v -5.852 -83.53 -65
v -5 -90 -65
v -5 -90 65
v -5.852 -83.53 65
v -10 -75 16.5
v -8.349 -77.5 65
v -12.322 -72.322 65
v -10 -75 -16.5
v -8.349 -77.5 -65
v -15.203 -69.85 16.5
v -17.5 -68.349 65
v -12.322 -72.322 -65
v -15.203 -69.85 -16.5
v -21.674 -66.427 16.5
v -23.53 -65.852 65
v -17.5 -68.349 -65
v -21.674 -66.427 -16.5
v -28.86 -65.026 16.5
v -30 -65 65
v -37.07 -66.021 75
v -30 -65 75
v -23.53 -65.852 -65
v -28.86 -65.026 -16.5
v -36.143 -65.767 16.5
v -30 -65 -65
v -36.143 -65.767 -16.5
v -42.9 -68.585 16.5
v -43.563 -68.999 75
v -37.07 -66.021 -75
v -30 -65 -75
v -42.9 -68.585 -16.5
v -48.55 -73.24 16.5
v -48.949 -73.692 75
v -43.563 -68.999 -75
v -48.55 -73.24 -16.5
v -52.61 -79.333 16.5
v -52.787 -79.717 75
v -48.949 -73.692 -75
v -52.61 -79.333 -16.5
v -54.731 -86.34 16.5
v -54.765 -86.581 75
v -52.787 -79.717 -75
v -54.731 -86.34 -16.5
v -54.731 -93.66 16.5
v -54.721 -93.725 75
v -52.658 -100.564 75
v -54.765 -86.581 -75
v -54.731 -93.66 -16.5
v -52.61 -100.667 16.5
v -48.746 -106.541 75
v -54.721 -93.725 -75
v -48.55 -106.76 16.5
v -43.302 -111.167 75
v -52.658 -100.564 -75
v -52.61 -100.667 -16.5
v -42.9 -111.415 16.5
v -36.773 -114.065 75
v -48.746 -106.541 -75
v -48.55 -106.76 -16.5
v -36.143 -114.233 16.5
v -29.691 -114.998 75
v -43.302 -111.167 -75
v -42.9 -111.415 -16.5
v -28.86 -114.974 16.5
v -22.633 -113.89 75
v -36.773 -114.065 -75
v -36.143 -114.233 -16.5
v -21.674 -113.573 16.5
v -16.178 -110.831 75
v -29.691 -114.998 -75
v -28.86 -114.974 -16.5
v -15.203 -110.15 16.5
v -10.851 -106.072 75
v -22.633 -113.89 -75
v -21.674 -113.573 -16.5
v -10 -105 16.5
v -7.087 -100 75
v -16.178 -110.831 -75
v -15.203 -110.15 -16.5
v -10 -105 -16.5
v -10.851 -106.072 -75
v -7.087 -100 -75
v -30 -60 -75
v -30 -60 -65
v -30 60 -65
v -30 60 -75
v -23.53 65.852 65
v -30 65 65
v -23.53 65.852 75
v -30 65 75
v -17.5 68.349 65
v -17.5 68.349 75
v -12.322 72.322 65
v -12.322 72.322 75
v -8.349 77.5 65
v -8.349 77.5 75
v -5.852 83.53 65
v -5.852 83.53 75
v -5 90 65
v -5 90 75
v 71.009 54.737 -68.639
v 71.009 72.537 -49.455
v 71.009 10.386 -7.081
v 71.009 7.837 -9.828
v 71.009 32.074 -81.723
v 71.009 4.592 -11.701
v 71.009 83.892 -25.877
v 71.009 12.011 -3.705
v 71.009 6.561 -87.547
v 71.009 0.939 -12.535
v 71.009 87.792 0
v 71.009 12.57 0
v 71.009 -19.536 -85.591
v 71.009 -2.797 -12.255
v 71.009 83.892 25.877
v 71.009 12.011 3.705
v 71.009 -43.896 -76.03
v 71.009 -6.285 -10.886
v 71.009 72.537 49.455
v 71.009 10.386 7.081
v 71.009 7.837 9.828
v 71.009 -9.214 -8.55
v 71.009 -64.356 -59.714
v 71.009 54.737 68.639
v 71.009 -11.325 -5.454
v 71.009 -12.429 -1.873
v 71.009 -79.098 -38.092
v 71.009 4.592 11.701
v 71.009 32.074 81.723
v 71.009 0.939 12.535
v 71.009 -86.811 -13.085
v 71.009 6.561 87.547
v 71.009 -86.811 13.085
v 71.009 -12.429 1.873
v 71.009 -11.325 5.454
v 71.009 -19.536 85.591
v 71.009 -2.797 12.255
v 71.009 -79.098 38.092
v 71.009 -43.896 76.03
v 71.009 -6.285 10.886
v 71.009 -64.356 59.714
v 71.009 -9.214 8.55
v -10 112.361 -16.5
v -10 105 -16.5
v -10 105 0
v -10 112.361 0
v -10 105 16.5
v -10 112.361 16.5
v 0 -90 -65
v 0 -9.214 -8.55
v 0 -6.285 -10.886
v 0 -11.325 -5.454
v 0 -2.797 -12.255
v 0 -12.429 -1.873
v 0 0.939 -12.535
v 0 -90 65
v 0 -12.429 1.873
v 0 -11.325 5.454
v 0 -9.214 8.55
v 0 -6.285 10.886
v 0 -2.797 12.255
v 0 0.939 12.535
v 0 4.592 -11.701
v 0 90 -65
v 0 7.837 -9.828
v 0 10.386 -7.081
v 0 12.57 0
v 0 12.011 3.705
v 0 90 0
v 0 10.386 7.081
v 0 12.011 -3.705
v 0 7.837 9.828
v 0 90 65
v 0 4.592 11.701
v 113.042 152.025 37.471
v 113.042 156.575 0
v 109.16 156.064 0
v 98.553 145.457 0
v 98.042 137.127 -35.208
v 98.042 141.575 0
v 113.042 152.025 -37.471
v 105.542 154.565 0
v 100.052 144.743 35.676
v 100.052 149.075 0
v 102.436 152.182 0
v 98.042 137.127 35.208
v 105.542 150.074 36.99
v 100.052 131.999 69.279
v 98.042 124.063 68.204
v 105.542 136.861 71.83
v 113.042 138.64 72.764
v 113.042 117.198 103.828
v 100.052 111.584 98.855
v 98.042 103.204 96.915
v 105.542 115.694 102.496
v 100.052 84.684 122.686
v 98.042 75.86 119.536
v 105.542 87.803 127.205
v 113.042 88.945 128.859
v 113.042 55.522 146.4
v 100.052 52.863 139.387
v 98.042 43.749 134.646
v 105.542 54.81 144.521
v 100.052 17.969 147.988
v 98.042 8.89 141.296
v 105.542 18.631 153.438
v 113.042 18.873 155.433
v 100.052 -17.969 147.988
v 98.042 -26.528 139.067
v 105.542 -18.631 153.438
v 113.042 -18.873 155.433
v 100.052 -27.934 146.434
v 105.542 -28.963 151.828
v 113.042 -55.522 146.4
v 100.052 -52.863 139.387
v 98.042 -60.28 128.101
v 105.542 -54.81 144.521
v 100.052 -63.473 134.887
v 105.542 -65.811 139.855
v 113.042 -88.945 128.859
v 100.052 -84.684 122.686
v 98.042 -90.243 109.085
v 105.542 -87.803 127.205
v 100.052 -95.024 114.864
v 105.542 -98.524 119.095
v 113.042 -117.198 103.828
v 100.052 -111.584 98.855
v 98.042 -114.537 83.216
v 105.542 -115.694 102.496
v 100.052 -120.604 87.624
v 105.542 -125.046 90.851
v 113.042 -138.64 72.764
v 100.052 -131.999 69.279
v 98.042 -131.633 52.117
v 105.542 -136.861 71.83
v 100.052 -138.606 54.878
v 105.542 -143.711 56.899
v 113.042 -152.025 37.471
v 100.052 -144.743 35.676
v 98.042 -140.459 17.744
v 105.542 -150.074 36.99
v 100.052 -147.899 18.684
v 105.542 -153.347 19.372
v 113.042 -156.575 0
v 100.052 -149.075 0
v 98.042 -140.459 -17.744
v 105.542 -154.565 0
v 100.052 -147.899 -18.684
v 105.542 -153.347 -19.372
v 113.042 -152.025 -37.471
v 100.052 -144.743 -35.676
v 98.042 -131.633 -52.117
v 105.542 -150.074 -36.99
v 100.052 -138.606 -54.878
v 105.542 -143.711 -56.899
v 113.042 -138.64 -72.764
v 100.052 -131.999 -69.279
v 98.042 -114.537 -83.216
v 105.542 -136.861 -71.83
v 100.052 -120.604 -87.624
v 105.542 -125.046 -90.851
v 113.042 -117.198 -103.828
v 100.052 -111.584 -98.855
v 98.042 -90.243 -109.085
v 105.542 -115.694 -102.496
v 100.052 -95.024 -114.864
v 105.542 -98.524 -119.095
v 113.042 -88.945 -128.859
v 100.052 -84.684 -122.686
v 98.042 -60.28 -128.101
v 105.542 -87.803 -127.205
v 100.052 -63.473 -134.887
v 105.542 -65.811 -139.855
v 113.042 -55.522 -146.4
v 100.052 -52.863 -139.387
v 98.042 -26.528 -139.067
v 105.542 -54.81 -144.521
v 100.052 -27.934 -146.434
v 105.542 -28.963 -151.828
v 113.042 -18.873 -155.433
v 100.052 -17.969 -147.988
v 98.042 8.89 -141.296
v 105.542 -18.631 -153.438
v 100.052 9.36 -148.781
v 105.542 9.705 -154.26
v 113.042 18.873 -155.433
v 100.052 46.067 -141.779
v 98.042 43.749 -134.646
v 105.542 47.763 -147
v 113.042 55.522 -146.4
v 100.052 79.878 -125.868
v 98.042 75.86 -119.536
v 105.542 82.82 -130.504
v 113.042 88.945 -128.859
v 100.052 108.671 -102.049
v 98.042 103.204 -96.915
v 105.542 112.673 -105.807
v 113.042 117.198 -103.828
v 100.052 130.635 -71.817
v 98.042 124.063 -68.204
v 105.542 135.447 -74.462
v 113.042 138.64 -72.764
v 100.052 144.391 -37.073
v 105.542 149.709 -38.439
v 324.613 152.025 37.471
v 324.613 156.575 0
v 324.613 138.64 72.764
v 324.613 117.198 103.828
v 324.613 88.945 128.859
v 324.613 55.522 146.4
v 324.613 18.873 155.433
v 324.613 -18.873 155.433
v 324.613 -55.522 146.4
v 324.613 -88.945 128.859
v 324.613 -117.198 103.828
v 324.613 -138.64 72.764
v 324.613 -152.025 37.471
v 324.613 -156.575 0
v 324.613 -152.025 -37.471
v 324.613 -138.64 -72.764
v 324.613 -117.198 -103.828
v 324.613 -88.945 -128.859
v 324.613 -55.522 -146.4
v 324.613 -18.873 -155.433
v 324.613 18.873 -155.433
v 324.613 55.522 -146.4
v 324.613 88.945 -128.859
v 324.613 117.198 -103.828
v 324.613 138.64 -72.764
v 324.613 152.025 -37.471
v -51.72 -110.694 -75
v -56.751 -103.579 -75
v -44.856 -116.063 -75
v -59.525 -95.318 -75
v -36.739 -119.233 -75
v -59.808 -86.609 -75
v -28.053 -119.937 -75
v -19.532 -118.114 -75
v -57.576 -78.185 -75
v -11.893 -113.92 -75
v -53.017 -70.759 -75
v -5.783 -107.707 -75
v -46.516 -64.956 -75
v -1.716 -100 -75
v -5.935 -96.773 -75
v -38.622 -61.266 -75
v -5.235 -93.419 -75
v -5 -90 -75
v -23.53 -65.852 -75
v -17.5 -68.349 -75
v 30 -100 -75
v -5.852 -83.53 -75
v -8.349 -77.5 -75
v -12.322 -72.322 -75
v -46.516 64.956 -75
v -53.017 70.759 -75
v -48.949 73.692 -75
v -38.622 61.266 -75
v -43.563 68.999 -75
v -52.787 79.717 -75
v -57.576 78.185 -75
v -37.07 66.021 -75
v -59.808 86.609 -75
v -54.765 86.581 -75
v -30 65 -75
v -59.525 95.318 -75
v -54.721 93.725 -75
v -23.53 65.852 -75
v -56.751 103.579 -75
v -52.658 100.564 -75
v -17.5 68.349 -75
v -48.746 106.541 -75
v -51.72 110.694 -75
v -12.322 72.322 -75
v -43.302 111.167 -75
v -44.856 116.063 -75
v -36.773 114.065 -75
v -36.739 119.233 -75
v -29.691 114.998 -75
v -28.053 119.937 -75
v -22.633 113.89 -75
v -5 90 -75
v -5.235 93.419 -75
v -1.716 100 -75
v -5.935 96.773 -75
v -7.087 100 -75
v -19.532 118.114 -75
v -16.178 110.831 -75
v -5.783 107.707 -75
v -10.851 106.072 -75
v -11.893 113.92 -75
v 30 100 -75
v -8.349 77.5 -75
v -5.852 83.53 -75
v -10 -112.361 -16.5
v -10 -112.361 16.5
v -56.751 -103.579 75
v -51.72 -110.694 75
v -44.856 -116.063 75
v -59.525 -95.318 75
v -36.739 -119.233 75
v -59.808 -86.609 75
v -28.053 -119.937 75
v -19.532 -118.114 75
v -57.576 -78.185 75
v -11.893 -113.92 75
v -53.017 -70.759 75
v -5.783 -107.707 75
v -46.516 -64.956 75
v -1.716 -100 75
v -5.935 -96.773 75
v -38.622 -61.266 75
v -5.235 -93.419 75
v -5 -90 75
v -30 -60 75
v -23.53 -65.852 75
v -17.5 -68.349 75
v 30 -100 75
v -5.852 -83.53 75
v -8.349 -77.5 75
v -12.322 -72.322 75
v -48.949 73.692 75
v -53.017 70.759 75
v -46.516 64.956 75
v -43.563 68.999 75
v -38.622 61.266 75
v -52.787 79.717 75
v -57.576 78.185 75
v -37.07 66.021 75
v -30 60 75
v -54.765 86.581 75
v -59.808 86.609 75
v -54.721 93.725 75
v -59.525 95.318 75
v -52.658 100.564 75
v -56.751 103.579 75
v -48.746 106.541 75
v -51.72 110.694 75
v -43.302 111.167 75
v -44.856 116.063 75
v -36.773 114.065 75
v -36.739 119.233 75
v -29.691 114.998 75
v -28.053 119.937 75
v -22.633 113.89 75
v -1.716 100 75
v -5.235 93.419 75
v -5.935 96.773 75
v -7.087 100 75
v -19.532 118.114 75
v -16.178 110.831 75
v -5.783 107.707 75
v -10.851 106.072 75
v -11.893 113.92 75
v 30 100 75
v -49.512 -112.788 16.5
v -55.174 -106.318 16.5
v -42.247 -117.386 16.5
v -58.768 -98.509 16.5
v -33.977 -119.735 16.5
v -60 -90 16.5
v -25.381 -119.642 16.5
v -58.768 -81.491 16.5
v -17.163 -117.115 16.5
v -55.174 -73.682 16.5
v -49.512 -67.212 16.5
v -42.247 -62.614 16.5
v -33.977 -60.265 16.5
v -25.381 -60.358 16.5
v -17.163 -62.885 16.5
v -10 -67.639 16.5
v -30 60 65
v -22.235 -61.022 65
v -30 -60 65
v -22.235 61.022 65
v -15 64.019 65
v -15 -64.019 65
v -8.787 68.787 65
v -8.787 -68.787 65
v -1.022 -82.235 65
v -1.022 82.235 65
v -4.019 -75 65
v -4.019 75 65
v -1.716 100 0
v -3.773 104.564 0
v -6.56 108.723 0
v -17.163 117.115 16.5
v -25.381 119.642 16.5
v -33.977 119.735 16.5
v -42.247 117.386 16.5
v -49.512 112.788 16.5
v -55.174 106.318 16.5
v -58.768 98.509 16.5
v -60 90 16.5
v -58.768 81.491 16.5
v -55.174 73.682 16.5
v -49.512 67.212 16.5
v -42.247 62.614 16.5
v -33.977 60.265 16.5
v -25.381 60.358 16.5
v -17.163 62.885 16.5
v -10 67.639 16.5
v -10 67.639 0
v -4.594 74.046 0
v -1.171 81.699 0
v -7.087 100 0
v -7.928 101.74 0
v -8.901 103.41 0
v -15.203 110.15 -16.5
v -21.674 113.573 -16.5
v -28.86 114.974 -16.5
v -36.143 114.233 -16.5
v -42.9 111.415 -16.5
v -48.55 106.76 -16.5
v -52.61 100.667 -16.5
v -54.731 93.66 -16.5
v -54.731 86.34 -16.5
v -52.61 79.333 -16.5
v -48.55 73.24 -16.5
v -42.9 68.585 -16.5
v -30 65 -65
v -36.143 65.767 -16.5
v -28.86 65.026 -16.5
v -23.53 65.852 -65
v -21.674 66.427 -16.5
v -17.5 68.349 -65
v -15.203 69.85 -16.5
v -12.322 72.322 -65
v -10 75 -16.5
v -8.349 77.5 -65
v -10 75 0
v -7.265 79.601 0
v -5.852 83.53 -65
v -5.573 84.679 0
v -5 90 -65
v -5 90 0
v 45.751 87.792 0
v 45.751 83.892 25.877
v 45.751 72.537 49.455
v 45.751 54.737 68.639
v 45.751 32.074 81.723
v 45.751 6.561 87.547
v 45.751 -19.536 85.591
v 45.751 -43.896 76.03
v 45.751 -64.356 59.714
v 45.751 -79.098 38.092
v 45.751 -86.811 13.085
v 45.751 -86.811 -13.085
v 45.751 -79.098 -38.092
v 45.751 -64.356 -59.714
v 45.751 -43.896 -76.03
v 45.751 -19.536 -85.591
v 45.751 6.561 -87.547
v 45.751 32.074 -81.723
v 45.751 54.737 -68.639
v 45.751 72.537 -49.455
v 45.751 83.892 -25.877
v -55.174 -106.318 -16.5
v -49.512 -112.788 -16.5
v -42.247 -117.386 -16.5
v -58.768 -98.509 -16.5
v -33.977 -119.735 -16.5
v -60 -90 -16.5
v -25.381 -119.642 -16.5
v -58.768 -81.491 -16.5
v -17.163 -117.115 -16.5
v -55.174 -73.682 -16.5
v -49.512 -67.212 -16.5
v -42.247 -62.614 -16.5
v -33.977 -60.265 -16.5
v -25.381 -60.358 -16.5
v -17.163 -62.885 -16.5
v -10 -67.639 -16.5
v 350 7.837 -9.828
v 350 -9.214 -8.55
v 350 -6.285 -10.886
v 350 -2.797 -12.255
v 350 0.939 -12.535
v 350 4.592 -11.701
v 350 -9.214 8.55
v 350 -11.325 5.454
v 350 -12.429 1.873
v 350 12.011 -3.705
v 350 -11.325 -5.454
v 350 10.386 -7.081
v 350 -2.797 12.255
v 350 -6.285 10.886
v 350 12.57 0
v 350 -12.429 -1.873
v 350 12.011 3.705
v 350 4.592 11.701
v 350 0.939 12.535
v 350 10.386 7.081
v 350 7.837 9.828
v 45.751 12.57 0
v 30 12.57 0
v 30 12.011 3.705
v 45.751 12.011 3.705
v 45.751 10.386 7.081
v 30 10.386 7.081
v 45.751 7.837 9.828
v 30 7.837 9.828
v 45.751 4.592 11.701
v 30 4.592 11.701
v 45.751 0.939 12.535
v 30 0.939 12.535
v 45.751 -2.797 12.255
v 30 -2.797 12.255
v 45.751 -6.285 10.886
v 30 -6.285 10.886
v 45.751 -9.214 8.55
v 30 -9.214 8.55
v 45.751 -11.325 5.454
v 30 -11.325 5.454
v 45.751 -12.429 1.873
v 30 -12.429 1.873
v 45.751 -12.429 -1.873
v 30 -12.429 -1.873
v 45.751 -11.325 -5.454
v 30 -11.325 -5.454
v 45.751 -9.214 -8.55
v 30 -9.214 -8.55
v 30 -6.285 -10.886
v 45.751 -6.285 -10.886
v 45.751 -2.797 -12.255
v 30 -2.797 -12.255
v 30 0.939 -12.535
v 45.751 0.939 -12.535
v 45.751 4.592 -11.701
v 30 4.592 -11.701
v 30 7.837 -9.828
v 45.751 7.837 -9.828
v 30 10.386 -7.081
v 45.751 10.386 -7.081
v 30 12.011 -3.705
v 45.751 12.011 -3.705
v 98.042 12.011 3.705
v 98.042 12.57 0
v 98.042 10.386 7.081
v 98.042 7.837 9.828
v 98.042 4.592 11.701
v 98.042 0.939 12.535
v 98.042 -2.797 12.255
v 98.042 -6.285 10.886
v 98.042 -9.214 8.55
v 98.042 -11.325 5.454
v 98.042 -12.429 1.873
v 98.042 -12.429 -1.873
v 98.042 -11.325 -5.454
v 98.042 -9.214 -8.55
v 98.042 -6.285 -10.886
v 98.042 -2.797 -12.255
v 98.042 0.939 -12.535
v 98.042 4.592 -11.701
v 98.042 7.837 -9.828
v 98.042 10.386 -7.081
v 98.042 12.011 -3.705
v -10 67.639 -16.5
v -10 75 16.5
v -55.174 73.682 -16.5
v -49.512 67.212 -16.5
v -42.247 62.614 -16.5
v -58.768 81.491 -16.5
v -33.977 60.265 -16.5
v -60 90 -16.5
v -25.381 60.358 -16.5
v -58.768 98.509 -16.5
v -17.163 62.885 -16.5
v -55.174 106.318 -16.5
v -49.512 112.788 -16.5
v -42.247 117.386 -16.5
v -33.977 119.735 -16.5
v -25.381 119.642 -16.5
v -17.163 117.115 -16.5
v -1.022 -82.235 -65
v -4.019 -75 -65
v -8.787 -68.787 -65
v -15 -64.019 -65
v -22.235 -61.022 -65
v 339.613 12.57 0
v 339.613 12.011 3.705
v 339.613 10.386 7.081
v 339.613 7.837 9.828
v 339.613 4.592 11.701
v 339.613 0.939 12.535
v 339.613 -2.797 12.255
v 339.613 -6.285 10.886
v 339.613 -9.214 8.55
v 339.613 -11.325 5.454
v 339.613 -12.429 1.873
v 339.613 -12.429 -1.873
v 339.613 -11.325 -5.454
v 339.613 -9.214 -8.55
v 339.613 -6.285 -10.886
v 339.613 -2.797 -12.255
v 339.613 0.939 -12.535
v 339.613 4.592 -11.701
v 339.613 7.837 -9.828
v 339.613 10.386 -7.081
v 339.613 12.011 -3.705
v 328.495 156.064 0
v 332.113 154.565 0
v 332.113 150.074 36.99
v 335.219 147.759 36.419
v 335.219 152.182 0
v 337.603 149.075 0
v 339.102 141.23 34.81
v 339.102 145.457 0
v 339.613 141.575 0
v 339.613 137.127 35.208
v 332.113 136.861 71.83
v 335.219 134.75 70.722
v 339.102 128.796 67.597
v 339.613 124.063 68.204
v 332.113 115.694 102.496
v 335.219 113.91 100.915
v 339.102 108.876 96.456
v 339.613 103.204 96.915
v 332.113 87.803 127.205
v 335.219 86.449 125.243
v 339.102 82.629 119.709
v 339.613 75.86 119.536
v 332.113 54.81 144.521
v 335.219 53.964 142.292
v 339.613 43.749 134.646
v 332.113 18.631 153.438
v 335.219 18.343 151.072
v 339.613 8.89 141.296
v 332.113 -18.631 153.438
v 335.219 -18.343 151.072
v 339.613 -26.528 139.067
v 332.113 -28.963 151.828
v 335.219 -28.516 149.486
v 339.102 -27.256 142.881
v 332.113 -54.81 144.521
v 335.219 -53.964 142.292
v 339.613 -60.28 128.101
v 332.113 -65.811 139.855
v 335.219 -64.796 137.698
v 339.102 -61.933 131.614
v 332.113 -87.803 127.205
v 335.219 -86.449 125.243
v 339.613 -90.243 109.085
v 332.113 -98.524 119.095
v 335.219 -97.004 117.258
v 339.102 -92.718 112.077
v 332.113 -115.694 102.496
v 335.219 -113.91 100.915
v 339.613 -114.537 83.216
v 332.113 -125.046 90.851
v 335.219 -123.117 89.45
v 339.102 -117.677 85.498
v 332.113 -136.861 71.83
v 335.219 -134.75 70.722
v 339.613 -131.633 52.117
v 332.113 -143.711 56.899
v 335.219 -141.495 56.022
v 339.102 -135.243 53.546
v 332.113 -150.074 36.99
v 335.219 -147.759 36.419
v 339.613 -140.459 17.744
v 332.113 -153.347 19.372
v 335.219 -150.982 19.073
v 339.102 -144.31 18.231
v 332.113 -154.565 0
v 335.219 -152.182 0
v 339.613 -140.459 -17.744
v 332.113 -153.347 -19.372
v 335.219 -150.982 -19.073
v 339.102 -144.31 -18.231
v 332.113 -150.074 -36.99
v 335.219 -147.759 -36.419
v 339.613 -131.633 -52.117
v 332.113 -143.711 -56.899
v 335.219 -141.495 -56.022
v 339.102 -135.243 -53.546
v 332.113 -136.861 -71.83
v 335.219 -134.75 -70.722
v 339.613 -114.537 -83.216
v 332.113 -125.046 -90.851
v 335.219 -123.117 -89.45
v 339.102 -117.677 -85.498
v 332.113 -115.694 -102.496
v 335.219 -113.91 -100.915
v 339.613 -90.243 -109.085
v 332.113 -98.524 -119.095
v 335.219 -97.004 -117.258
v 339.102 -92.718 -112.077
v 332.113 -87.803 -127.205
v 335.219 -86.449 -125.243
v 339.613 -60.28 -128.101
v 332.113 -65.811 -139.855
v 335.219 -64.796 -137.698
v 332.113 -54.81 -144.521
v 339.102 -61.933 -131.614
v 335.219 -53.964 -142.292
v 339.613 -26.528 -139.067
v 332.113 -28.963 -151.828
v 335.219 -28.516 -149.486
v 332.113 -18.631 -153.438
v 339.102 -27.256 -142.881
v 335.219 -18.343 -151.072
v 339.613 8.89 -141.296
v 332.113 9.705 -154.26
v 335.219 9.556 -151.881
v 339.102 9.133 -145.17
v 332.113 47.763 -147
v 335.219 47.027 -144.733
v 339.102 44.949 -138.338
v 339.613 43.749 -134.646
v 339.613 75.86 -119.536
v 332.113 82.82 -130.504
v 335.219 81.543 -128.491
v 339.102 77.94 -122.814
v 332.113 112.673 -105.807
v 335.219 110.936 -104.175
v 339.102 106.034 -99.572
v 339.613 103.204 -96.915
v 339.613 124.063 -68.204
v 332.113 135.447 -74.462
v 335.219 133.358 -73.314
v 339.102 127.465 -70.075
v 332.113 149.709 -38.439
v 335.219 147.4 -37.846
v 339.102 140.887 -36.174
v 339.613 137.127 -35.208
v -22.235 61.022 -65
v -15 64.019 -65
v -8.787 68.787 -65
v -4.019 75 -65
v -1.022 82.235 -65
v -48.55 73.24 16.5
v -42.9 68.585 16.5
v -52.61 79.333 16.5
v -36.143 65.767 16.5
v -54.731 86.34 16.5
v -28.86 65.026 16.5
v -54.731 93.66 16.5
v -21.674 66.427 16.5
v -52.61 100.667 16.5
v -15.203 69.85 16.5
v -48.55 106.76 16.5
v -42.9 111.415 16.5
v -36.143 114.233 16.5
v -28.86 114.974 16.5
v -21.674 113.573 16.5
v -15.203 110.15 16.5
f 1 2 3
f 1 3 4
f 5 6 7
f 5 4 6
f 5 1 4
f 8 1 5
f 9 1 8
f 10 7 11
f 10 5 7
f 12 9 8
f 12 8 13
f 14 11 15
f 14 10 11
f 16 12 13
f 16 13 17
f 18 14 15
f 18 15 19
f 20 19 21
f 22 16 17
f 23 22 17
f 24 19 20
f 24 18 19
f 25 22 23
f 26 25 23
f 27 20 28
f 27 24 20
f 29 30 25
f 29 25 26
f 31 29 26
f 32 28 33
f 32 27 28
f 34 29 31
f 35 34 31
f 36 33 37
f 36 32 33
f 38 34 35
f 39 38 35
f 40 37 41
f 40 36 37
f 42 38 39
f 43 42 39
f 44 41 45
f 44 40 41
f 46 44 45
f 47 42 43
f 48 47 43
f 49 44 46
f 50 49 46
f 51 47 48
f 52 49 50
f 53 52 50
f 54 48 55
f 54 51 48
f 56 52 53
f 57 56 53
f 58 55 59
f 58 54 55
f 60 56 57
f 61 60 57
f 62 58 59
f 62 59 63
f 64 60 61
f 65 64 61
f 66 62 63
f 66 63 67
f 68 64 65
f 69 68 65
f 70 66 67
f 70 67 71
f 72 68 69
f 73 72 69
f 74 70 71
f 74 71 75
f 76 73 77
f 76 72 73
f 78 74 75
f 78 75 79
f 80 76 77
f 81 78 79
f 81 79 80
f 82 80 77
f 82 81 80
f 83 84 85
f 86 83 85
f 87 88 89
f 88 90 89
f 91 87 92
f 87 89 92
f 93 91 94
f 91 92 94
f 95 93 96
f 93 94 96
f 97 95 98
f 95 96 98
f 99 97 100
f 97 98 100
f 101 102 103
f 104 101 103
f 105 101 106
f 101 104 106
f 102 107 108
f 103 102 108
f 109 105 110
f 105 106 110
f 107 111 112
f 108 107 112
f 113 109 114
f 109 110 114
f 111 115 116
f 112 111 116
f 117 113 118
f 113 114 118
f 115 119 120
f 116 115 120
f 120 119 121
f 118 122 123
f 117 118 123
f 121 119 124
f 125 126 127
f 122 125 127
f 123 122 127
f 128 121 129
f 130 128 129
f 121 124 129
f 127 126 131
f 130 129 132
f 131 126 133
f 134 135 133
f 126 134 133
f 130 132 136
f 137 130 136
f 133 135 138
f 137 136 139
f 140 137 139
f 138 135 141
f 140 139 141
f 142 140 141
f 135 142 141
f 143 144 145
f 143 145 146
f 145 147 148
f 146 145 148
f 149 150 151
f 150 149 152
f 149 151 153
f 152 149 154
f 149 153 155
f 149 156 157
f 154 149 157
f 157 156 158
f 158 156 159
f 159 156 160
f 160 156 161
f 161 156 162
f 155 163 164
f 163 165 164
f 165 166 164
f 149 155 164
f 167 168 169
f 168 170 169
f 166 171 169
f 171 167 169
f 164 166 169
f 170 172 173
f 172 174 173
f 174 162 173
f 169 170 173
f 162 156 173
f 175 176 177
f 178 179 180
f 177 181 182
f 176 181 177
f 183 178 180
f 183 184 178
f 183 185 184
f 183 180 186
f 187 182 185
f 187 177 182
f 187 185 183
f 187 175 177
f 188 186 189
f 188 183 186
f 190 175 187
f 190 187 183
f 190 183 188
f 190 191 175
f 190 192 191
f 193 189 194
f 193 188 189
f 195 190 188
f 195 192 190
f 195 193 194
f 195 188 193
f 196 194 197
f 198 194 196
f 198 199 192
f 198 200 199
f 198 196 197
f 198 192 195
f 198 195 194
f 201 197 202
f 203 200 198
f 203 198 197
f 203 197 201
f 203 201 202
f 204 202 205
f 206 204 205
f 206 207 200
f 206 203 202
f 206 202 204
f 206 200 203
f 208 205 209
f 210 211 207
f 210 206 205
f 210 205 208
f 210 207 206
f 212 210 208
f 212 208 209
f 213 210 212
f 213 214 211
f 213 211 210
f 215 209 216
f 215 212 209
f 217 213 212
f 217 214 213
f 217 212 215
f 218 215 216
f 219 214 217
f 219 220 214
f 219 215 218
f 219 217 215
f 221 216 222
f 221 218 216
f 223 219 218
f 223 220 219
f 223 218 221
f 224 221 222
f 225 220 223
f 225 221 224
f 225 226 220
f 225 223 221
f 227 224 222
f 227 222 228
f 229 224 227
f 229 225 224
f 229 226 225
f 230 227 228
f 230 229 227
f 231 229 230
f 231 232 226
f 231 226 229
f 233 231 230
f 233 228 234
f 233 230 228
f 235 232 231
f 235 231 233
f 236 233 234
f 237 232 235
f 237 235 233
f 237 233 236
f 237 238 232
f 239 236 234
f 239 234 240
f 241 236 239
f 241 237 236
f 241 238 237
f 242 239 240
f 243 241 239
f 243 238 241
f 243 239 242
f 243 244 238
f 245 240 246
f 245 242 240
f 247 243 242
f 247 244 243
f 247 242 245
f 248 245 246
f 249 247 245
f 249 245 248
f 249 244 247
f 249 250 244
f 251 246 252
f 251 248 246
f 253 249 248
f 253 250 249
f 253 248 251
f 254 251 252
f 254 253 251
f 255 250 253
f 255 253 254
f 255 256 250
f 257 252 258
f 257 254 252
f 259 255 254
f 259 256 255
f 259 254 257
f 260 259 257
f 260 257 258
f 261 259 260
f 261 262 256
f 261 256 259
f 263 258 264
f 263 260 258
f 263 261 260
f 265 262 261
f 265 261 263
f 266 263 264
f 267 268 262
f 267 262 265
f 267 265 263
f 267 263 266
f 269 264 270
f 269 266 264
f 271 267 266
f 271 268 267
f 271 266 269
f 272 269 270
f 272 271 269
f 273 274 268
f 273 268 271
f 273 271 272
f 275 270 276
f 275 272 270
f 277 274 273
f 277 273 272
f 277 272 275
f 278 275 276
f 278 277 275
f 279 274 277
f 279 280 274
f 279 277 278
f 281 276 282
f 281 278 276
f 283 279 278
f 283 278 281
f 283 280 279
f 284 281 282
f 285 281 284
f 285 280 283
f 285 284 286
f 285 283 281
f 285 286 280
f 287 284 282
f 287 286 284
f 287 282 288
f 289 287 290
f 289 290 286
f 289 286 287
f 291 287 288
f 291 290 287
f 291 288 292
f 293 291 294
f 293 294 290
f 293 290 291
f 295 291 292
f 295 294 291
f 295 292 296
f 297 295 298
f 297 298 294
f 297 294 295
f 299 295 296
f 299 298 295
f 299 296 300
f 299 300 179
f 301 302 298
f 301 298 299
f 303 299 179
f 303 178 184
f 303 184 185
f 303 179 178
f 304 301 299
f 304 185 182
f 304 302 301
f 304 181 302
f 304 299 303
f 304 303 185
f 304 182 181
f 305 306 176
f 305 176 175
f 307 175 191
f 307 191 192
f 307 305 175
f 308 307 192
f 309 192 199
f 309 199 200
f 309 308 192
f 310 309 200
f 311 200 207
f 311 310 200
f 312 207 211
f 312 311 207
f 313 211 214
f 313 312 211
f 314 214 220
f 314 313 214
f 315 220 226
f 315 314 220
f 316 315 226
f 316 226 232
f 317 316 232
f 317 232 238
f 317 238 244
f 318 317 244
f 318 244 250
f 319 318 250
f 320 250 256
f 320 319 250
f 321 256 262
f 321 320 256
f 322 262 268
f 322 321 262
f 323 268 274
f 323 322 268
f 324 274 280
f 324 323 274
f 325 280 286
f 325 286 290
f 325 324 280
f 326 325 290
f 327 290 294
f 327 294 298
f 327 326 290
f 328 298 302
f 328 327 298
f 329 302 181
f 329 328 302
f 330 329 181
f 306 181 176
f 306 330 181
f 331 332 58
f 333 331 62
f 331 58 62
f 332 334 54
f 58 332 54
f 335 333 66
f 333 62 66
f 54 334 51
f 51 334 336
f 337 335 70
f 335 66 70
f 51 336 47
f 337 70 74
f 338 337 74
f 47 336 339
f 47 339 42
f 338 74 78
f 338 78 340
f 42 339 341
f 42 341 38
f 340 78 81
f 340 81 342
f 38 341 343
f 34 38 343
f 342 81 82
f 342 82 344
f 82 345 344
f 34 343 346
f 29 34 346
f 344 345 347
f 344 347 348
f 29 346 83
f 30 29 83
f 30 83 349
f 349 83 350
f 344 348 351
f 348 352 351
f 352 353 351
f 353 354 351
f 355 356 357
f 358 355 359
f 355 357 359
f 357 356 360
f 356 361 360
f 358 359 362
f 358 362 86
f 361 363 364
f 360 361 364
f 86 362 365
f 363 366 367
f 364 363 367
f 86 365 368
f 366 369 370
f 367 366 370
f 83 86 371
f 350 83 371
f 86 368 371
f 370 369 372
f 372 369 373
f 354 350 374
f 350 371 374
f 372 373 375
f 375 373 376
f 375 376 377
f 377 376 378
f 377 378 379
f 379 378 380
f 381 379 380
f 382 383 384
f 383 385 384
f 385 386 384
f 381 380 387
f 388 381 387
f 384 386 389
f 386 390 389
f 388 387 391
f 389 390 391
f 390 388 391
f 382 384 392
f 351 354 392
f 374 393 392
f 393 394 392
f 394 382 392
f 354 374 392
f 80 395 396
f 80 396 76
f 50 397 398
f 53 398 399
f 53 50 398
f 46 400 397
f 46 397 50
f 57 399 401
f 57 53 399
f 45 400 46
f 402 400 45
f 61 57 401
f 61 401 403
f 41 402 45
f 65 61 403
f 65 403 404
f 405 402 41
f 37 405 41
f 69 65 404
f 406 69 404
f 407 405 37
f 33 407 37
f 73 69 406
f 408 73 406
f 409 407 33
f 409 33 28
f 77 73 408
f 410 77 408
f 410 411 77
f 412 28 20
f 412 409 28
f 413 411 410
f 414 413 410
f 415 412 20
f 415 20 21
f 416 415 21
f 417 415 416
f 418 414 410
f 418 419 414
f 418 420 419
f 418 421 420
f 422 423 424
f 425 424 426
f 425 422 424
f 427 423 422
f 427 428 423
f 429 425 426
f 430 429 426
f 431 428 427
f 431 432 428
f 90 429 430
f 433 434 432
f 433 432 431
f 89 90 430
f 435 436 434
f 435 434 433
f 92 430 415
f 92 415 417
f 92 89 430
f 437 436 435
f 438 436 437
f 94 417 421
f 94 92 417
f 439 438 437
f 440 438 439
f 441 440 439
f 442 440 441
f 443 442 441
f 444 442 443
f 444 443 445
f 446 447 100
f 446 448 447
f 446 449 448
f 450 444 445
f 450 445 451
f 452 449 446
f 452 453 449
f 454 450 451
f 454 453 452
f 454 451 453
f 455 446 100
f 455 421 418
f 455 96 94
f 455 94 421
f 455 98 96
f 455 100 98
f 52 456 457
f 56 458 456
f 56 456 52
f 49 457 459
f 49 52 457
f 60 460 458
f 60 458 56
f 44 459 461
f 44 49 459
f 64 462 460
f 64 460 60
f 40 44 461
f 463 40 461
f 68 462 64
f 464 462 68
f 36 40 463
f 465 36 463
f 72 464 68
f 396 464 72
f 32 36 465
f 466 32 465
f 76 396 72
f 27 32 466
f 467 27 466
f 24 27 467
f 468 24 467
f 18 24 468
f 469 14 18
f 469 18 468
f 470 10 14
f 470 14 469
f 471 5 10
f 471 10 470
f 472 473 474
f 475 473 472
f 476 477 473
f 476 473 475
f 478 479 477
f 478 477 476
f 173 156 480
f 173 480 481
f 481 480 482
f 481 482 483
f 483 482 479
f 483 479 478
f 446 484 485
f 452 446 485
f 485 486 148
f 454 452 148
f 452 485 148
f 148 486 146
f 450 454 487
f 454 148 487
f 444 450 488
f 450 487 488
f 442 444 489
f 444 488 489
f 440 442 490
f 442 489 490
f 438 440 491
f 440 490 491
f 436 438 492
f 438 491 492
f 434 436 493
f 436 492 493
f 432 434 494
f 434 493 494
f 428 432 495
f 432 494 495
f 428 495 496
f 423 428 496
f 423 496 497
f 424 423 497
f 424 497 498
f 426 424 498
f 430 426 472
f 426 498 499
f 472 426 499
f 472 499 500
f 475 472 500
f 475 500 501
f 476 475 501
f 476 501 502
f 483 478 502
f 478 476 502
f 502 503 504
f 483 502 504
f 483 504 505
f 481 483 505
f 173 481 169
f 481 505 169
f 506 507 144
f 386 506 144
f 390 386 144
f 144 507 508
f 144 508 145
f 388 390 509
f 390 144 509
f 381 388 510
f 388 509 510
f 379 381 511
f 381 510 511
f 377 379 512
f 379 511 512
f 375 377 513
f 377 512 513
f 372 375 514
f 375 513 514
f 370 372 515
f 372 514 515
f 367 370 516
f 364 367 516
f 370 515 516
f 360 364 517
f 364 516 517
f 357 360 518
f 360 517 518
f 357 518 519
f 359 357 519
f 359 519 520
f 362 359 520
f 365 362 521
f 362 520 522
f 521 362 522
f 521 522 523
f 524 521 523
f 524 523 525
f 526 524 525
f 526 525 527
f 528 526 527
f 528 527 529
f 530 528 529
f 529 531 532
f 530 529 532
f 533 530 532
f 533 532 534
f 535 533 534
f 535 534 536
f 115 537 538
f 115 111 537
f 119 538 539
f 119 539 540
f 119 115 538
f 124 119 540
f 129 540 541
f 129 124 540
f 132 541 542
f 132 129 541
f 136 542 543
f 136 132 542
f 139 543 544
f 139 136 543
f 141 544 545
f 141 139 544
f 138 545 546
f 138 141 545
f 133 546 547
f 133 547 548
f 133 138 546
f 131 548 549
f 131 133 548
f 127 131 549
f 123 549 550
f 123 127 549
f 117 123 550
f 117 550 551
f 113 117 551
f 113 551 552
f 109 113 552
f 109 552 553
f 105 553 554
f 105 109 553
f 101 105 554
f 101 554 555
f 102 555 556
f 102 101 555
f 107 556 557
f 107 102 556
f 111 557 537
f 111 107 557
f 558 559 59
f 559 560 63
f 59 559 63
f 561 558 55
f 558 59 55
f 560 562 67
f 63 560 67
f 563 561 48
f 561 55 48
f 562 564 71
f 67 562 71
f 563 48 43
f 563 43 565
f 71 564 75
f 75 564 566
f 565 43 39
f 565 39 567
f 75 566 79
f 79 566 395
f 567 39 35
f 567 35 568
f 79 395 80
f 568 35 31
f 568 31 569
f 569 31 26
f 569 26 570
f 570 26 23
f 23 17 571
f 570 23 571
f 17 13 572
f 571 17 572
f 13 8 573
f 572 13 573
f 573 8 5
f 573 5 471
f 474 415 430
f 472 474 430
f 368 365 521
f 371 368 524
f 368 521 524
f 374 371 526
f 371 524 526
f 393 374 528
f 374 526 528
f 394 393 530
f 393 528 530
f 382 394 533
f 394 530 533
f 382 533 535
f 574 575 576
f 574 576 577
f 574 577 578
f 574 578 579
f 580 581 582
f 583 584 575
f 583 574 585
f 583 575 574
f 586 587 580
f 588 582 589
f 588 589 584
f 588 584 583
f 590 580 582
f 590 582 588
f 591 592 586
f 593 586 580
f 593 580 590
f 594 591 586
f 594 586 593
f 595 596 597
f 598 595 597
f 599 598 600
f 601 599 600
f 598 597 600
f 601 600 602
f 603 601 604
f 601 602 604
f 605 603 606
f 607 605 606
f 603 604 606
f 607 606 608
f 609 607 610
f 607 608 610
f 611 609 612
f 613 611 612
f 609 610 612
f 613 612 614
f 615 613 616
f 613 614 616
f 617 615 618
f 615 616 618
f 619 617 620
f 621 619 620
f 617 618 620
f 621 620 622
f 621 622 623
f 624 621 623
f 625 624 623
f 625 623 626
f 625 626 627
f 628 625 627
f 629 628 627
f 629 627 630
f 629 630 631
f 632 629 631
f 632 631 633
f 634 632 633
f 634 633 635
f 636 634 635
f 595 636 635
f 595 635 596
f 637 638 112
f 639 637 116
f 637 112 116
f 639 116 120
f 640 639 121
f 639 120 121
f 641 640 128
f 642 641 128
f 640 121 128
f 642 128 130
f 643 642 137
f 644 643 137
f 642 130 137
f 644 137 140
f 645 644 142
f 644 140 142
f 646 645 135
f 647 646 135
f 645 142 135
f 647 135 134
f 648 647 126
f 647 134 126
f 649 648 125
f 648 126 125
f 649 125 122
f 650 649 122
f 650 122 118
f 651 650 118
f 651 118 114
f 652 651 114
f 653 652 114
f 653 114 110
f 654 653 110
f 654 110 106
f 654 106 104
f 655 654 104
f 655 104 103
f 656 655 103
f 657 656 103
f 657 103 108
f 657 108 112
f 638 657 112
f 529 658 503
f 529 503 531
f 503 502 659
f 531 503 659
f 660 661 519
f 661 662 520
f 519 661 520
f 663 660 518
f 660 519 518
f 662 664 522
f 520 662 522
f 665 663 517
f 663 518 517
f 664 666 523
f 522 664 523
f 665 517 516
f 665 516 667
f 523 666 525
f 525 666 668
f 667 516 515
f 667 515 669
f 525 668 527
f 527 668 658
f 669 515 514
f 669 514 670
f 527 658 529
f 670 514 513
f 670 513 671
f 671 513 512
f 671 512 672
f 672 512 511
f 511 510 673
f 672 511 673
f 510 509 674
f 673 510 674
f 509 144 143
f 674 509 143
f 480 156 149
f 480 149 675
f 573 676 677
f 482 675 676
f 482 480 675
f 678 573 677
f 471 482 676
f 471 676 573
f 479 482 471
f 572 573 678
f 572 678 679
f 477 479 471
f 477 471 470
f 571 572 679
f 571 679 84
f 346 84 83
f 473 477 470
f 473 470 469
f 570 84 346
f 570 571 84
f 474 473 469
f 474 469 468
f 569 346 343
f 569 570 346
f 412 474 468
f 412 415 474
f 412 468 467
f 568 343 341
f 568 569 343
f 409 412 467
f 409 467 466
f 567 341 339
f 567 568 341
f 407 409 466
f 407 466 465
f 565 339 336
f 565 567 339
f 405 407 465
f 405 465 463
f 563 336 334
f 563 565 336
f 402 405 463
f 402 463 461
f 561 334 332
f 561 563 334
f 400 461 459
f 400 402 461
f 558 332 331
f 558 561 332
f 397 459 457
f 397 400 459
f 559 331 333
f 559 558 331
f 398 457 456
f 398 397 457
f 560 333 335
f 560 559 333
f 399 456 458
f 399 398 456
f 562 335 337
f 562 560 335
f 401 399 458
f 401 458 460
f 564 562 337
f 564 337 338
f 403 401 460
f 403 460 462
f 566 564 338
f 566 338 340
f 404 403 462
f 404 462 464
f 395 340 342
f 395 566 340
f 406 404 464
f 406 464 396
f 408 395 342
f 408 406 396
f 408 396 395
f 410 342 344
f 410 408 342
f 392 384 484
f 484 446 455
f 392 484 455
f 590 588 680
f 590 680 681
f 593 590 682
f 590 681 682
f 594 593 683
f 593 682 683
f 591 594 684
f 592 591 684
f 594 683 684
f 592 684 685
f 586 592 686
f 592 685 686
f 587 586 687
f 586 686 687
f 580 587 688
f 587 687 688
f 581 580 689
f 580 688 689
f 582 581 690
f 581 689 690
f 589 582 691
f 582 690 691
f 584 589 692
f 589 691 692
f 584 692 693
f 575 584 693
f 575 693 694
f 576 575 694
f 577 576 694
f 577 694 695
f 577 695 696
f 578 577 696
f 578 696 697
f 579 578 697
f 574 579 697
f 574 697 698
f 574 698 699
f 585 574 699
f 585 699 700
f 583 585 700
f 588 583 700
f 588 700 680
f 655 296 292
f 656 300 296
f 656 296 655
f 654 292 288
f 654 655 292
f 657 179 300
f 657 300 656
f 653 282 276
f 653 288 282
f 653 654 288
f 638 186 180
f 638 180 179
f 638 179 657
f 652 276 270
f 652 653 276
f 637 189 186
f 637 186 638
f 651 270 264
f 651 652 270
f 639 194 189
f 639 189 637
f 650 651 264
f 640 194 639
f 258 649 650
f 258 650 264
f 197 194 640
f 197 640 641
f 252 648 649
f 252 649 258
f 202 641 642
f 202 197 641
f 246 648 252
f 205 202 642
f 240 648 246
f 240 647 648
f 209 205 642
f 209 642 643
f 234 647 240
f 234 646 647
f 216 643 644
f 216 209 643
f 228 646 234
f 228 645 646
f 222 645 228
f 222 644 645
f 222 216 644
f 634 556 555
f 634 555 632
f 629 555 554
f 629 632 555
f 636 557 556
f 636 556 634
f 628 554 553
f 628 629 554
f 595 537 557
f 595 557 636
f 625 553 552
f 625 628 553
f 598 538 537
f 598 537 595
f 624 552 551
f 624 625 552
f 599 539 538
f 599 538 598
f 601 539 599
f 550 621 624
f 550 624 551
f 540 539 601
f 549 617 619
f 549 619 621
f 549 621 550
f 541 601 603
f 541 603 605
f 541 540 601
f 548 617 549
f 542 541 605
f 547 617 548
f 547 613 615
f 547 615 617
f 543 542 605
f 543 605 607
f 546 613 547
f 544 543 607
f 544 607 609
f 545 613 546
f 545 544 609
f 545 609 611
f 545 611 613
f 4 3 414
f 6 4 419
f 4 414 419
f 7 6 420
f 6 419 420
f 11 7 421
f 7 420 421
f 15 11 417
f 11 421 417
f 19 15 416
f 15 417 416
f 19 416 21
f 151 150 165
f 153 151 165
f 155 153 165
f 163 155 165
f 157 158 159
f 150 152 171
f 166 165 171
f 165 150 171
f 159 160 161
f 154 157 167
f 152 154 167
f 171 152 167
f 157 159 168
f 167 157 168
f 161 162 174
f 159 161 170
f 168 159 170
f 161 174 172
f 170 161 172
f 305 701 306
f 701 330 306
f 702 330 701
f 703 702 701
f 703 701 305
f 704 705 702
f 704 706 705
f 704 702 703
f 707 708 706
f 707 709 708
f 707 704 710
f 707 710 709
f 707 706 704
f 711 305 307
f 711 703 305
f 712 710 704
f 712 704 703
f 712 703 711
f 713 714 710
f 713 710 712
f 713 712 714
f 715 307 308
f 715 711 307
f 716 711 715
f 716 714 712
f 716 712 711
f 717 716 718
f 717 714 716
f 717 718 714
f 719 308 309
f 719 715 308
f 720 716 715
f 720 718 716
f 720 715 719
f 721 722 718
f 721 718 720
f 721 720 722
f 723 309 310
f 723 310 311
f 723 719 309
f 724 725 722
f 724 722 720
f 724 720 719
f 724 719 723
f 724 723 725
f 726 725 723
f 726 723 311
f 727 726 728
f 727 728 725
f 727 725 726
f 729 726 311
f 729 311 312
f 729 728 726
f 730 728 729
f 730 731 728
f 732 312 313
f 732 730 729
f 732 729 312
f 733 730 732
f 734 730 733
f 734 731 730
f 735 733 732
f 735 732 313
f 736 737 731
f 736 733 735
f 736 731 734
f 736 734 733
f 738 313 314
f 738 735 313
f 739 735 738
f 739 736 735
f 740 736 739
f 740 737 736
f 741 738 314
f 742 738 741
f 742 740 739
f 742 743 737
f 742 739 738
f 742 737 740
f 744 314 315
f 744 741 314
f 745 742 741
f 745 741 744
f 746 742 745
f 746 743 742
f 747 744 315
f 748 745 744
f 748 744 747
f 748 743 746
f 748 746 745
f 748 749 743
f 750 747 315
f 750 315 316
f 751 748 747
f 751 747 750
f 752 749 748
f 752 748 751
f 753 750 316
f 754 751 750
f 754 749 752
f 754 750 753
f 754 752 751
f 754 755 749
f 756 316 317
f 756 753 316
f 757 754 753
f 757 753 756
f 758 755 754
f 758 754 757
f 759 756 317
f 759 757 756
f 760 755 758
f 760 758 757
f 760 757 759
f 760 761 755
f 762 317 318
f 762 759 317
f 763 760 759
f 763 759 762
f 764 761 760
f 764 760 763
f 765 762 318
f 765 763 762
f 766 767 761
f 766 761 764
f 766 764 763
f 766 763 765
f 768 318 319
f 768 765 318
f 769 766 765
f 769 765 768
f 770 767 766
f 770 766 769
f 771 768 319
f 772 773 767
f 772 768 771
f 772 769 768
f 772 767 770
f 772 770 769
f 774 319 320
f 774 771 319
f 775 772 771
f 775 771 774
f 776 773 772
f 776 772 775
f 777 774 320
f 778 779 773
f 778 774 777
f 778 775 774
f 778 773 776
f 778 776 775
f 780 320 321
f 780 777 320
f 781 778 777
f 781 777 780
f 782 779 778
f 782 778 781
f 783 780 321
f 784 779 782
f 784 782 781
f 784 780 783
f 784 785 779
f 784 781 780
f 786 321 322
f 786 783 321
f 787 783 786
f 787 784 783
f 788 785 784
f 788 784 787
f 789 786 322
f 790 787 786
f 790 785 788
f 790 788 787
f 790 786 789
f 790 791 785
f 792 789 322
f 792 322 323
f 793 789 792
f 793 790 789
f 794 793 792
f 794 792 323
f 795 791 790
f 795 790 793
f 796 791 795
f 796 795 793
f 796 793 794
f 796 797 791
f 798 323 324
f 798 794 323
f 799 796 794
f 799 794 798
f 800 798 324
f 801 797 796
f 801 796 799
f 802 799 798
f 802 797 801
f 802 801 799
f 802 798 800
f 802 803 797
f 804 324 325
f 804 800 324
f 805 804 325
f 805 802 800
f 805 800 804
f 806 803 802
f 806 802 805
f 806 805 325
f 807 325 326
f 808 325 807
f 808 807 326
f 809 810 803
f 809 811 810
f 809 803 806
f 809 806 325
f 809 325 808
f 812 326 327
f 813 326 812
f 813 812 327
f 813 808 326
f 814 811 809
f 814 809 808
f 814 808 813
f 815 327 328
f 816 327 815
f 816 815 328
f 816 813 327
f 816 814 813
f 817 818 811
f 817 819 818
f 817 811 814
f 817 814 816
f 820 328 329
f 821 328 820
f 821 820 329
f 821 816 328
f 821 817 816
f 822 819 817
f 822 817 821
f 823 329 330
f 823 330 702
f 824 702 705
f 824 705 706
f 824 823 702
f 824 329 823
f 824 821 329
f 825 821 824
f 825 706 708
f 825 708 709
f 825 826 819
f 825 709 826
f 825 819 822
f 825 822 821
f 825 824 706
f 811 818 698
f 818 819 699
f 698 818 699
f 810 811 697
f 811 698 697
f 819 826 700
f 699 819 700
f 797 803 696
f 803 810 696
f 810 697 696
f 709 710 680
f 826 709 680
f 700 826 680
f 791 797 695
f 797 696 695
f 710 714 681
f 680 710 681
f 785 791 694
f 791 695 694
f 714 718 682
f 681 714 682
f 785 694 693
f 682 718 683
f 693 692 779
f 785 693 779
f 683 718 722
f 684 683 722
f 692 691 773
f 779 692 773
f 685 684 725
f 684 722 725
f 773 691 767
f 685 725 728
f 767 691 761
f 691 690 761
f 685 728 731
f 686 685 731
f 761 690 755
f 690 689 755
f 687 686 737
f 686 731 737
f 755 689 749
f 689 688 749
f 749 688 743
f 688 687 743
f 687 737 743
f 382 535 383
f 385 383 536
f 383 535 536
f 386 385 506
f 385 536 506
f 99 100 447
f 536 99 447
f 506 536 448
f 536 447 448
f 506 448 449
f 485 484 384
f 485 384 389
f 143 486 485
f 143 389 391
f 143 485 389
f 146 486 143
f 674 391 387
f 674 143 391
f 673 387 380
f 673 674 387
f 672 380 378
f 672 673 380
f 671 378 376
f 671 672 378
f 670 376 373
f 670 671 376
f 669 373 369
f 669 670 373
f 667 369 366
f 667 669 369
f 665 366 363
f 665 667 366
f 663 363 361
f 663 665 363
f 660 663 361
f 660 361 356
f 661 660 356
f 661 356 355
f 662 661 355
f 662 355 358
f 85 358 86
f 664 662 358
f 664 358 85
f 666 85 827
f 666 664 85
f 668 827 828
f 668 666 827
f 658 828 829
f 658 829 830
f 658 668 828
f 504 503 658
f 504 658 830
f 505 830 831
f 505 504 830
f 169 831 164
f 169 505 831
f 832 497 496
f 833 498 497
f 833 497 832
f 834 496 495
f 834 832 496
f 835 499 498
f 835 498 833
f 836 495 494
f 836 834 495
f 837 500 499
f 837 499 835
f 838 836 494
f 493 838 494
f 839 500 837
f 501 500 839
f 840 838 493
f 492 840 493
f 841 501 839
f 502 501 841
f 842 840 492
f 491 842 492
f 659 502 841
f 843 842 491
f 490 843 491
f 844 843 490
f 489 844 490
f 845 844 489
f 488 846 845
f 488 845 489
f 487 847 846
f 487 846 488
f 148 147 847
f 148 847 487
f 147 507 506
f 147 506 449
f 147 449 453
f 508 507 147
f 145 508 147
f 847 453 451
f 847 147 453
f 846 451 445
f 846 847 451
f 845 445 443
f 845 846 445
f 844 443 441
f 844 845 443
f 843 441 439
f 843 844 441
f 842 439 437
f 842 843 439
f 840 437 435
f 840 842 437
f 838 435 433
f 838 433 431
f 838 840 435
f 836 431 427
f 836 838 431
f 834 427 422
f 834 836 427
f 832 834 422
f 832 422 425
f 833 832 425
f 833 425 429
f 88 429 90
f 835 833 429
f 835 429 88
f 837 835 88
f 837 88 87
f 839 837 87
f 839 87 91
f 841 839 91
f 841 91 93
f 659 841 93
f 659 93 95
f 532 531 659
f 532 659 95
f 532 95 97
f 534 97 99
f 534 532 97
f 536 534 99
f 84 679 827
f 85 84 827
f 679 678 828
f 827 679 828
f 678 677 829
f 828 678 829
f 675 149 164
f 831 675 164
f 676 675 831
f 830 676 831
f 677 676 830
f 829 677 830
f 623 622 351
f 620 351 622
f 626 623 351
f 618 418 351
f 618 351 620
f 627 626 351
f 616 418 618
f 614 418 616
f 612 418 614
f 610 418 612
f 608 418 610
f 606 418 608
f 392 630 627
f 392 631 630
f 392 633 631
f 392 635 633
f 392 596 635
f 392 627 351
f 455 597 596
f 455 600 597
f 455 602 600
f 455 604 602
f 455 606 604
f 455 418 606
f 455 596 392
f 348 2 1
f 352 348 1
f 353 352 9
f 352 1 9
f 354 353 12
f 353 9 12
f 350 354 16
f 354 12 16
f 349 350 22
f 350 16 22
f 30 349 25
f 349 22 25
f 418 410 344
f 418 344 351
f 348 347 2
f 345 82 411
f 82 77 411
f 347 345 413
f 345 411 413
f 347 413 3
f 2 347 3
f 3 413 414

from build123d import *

# Parameters (mm, degrees)
F0_W      = 25.2578889922
F0_H      = 87.7920170172
F0_W_2    = 241.5705997671
F0_H_2    = 156.5749233454
F0_W_3    = 60
F0_H_3    = 200
F4_DEPTH  = 75
F3_R      = 12.5698897047
F5_DEPTH  = 5000
F6_W      = 180
F6_H      = 130
F7_DEPTH  = 6000
F8_R      = 30
F8_R_2    = 25
F9_DEPTH  = 75
F11_W     = 40000
F11_H     = 33
F12_DEPTH = 15000
F13_DEPTH = 1000
F14_DEPTH = 1000
F15_DEPTH = 350
F16_R     = 15


with BuildPart() as f1:
    # F0 (on Top) → F1 (revolve)
    with BuildSketch(Plane.XY):
        with Locations((58.379718929, 43.8960085086)):
            Rectangle(F0_W, F0_H)
    revolve(axis=Axis((58.379718929, 0, 0), (1, 0, 0)))


with BuildPart() as f2:
    # F0 (on Top) → F2 (revolve)
    with BuildSketch(Plane.XY):
        with Locations((218.8274469054, 78.2874616727)):
            Rectangle(F0_W_2, F0_H_2)
    revolve(axis=Axis((218.8274469054, 0, 0), (1, 0, 0)))


with BuildPart() as f4:
    # F0 (on Top) → F4 (new body, symmetric)
    with BuildSketch(Plane.XY):
        Rectangle(F0_W_3, F0_H_3)
    extrude(amount=F4_DEPTH, both=True)


with BuildPart() as f5_tool:
    # F3 (on Right) → F5 (new body, symmetric)
    with BuildSketch(Plane.YZ):
        Circle(F3_R)
    extrude(amount=F5_DEPTH, both=True)


with BuildPart() as f1_1:
    add(f1.part)

    # F5: cut by f5_tool
    add(f5_tool.part, mode=Mode.SUBTRACT)



with BuildPart() as f2_1:
    add(f2.part)

    # F5: cut by f5_tool
    add(f5_tool.part, mode=Mode.SUBTRACT)


with BuildPart() as f4_1:
    add(f4.part)

    # F5: cut by f5_tool
    add(f5_tool.part, mode=Mode.SUBTRACT)

    # F6 (on Right) → F7 (cut)
    with BuildSketch(Plane.YZ):
        Rectangle(F6_W, F6_H)
    extrude(amount=-F7_DEPTH, mode=Mode.SUBTRACT)

    # F8 (on Top) → F9 (join, symmetric)
    with BuildSketch(Plane.XY):
        with Locations((-30, 90)):
            Circle(F8_R)
        with Locations((-30, 90)):
            Circle(F8_R_2, mode=Mode.SUBTRACT)
        with Locations((-30, -90)):
            Circle(F8_R)
        with Locations((-30, -90)):
            Circle(F8_R_2, mode=Mode.SUBTRACT)
    extrude(amount=F9_DEPTH, both=True)

    # F11 (on offset) → F12 (cut)
    with BuildSketch(Plane.YZ.offset(-10)):
        Rectangle(F11_W, F11_H)
    extrude(amount=-F12_DEPTH, mode=Mode.SUBTRACT)

    # F8 (on Top) → F13 (cut, symmetric)
    with BuildSketch(Plane.XY):
        with Locations((-30, 90)):
            Circle(F8_R_2)
    extrude(amount=F13_DEPTH, both=True, mode=Mode.SUBTRACT)

    # F8 (on Top) → F14 (cut, symmetric)
    with BuildSketch(Plane.XY):
        with Locations((-30, -90)):
            Circle(F8_R_2)
    extrude(amount=F14_DEPTH, both=True, mode=Mode.SUBTRACT)


with BuildPart() as f1_2:
    add(f1_1.part)

    add(f2_1.part)  # F15 merges F2

    add(f4_1.part)  # F15 merges F4
    # F3 (on Right) → F15 (join)
    with BuildSketch(Plane.YZ):
        Circle(F3_R)
    extrude(amount=F15_DEPTH)

    # F16
    f16_edges = [f1_2.edges().sort_by_distance(p)[0] for p in [
        (339.612747, -156.574923, 0),
        (98.042147, -156.574923, 0),
    ]]
    fillet(f16_edges, radius=F16_R)


solid = f1_2.part
